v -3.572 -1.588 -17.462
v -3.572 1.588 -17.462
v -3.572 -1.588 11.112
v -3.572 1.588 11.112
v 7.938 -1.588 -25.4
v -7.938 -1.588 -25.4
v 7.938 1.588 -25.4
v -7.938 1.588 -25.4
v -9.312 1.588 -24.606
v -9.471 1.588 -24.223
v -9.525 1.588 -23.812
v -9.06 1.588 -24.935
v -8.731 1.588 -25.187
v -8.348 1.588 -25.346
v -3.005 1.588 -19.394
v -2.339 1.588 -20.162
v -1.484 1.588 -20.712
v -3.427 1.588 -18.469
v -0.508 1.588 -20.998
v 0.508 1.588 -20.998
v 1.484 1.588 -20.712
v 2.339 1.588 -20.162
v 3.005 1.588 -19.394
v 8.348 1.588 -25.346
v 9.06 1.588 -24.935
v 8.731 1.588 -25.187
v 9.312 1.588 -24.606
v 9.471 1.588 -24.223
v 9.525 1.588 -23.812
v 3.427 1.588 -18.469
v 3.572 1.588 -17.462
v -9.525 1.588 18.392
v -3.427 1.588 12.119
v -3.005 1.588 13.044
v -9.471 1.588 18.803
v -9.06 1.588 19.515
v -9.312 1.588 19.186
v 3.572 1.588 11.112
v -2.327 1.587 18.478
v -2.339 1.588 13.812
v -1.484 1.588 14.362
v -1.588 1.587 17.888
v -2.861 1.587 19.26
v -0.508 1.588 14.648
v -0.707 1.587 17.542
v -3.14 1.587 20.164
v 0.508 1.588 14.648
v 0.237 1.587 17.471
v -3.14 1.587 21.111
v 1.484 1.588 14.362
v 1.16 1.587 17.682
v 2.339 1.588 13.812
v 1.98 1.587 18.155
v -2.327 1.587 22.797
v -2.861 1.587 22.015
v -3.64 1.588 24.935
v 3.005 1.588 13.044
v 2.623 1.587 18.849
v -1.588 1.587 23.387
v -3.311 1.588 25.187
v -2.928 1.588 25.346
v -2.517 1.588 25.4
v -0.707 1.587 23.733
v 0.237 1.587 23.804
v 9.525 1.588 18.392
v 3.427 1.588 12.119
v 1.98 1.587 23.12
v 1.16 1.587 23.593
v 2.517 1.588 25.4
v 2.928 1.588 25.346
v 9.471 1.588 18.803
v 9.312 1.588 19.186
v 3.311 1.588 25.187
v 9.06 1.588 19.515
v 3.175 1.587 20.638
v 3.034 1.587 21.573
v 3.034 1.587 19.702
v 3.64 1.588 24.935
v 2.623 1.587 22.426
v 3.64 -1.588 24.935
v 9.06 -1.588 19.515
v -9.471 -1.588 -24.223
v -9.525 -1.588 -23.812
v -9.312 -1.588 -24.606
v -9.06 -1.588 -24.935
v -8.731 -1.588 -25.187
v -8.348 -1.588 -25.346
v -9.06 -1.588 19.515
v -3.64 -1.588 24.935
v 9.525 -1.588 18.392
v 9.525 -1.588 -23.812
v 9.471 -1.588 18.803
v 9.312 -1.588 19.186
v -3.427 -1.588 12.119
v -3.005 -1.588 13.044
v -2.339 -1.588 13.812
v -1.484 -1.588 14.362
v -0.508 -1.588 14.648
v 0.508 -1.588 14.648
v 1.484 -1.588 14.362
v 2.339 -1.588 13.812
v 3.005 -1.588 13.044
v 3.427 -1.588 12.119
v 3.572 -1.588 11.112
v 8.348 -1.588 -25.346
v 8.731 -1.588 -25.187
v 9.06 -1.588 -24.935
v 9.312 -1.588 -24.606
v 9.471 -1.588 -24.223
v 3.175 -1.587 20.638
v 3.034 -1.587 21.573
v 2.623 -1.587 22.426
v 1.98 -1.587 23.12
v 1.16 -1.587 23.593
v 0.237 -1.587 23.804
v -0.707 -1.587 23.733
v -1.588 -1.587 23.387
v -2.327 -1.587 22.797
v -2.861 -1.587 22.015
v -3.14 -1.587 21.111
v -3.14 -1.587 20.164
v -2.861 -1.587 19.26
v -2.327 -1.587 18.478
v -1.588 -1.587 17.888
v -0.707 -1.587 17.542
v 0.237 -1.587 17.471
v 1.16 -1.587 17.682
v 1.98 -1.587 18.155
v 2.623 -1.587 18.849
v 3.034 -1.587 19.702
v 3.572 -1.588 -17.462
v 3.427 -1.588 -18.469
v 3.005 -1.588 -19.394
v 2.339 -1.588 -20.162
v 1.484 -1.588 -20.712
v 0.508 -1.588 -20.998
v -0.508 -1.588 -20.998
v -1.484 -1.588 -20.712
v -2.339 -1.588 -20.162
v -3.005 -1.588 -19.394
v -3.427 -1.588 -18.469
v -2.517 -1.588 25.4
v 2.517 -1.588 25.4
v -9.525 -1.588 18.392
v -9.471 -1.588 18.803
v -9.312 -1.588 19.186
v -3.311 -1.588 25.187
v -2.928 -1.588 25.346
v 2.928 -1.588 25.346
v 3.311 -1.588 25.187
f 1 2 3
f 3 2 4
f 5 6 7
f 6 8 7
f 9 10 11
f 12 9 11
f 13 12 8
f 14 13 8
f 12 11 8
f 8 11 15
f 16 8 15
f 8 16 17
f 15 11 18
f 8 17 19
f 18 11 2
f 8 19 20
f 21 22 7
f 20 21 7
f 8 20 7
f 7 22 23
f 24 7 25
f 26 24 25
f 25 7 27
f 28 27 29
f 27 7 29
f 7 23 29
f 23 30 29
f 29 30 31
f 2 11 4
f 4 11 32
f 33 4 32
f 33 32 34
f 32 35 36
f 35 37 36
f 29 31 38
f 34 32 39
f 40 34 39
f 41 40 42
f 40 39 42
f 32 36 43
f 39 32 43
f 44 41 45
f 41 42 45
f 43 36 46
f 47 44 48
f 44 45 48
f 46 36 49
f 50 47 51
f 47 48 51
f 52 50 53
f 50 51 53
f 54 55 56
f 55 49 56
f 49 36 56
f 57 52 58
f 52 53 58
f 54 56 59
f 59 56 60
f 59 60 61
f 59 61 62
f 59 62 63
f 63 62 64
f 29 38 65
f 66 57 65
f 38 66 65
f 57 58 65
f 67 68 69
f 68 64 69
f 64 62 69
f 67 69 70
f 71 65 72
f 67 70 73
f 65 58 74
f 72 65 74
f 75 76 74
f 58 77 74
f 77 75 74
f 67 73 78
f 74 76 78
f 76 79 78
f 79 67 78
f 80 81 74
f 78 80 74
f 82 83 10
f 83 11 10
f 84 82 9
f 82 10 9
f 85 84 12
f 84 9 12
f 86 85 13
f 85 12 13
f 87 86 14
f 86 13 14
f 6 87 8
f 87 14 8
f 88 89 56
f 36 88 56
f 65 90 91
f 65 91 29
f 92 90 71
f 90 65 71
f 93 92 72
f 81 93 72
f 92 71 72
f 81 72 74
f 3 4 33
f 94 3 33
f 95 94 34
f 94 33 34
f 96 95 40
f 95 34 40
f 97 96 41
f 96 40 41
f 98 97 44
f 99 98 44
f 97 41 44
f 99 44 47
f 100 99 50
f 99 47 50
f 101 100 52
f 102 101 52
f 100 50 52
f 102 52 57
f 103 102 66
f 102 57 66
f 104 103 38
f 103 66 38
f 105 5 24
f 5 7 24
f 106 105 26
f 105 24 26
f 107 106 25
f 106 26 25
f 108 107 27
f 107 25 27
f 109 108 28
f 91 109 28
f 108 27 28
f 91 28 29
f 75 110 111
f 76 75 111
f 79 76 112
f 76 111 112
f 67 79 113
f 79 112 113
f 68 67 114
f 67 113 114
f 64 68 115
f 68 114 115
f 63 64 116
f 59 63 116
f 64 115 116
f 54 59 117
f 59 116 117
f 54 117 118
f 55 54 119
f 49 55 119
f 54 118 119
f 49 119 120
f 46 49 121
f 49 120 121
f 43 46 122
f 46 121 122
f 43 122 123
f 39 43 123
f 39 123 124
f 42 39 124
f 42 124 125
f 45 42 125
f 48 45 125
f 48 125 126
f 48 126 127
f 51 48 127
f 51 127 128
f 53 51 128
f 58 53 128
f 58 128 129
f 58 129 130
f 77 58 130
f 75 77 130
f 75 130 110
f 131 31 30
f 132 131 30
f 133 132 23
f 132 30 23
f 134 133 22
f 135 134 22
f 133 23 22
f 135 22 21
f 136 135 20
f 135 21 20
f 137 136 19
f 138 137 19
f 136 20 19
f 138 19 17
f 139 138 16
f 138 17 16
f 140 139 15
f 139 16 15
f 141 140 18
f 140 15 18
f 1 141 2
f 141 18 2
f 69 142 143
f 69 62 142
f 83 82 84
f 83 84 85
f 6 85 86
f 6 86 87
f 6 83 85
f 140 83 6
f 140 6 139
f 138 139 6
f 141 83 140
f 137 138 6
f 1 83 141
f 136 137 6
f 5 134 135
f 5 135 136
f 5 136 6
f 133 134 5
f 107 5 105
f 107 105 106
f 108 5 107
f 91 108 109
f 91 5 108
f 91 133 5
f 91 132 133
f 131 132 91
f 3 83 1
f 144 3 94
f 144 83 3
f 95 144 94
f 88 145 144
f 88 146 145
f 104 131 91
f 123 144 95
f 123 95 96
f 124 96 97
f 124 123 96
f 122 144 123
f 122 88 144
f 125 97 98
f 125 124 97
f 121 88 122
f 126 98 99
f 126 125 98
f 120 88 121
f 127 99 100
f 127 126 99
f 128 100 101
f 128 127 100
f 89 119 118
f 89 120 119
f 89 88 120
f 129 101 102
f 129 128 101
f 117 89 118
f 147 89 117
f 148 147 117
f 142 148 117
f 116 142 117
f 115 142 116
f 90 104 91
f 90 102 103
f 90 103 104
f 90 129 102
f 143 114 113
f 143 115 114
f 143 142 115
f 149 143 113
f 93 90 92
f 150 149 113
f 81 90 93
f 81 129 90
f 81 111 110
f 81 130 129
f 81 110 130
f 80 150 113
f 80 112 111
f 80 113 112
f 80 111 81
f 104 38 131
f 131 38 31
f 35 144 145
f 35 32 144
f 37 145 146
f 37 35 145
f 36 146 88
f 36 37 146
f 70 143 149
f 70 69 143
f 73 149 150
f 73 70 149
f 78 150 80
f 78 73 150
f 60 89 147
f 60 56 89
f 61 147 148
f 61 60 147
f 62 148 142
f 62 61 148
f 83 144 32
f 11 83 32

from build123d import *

# Parameters (mm, degrees)
SKETCH1_W                   = 19.05
SKETCH1_H                   = 3.175
EXTRUDE1_DEPTH              = 25.4
CUT_EXTRUDE1_DEPTH          = 28.312382723
CHAMFER1_SIZE               = 6.35
F_1_4_0_25_DIAMETER_HOLE1_D = 6.35
FILLET1_R                   = 1.5875


with BuildPart() as part:
    # Sketch1 → Extrude1 (new, symmetric)
    with BuildSketch(Plane.XY):
        Rectangle(SKETCH1_W, SKETCH1_H)
    extrude(amount=EXTRUDE1_DEPTH, both=True)

    # Sketch2 → Cut-Extrude1 (cut, through all)
    with BuildSketch(Plane(origin=(0, 1.5875, 0), x_dir=(-1, 0, 0), z_dir=(0, 1, 0))):
        with BuildLine():
            Line((3.571875, -17.4625), (3.571875, 11.1125))
            ThreePointArc((3.571875, 11.1125), (0, 14.684375), (-3.571875, 11.1125))
            Line((-3.571875, 11.1125), (-3.571875, -17.4625))
            ThreePointArc((-3.571875, -17.4625), (0, -21.034375), (3.571875, -17.4625))
        make_face()
    extrude(amount=-CUT_EXTRUDE1_DEPTH, mode=Mode.SUBTRACT)

    # Chamfer1
    chamfer1_edges = [part.edges().sort_by_distance(p)[0] for p in [
        (9.525, 0, 25.4),
        (-9.525, 0, 25.4),
    ]]
    chamfer(chamfer1_edges, length=CHAMFER1_SIZE)

    # 1/4 (0.25) Diameter Hole1 (through all)
    with Locations(Plane(origin=(0, 1.5875, 0), x_dir=(-1, 0, 0), z_dir=(0, 1, 0))):
        with Locations((0, 20.6375)):
            Hole(F_1_4_0_25_DIAMETER_HOLE1_D / 2)

    # Fillet1
    fillet1_edges = [part.edges().sort_by_distance(p)[0] for p in [
        (3.175, 0, 25.4),
        (-3.175, 0, 25.4),
        (-9.525, 0, 19.05),
        (9.525, 0, 19.05),
        (9.525, 0, -25.4),
        (-9.525, 0, -25.4),
    ]]
    fillet(fillet1_edges, radius=FILLET1_R)


solid = part.part
